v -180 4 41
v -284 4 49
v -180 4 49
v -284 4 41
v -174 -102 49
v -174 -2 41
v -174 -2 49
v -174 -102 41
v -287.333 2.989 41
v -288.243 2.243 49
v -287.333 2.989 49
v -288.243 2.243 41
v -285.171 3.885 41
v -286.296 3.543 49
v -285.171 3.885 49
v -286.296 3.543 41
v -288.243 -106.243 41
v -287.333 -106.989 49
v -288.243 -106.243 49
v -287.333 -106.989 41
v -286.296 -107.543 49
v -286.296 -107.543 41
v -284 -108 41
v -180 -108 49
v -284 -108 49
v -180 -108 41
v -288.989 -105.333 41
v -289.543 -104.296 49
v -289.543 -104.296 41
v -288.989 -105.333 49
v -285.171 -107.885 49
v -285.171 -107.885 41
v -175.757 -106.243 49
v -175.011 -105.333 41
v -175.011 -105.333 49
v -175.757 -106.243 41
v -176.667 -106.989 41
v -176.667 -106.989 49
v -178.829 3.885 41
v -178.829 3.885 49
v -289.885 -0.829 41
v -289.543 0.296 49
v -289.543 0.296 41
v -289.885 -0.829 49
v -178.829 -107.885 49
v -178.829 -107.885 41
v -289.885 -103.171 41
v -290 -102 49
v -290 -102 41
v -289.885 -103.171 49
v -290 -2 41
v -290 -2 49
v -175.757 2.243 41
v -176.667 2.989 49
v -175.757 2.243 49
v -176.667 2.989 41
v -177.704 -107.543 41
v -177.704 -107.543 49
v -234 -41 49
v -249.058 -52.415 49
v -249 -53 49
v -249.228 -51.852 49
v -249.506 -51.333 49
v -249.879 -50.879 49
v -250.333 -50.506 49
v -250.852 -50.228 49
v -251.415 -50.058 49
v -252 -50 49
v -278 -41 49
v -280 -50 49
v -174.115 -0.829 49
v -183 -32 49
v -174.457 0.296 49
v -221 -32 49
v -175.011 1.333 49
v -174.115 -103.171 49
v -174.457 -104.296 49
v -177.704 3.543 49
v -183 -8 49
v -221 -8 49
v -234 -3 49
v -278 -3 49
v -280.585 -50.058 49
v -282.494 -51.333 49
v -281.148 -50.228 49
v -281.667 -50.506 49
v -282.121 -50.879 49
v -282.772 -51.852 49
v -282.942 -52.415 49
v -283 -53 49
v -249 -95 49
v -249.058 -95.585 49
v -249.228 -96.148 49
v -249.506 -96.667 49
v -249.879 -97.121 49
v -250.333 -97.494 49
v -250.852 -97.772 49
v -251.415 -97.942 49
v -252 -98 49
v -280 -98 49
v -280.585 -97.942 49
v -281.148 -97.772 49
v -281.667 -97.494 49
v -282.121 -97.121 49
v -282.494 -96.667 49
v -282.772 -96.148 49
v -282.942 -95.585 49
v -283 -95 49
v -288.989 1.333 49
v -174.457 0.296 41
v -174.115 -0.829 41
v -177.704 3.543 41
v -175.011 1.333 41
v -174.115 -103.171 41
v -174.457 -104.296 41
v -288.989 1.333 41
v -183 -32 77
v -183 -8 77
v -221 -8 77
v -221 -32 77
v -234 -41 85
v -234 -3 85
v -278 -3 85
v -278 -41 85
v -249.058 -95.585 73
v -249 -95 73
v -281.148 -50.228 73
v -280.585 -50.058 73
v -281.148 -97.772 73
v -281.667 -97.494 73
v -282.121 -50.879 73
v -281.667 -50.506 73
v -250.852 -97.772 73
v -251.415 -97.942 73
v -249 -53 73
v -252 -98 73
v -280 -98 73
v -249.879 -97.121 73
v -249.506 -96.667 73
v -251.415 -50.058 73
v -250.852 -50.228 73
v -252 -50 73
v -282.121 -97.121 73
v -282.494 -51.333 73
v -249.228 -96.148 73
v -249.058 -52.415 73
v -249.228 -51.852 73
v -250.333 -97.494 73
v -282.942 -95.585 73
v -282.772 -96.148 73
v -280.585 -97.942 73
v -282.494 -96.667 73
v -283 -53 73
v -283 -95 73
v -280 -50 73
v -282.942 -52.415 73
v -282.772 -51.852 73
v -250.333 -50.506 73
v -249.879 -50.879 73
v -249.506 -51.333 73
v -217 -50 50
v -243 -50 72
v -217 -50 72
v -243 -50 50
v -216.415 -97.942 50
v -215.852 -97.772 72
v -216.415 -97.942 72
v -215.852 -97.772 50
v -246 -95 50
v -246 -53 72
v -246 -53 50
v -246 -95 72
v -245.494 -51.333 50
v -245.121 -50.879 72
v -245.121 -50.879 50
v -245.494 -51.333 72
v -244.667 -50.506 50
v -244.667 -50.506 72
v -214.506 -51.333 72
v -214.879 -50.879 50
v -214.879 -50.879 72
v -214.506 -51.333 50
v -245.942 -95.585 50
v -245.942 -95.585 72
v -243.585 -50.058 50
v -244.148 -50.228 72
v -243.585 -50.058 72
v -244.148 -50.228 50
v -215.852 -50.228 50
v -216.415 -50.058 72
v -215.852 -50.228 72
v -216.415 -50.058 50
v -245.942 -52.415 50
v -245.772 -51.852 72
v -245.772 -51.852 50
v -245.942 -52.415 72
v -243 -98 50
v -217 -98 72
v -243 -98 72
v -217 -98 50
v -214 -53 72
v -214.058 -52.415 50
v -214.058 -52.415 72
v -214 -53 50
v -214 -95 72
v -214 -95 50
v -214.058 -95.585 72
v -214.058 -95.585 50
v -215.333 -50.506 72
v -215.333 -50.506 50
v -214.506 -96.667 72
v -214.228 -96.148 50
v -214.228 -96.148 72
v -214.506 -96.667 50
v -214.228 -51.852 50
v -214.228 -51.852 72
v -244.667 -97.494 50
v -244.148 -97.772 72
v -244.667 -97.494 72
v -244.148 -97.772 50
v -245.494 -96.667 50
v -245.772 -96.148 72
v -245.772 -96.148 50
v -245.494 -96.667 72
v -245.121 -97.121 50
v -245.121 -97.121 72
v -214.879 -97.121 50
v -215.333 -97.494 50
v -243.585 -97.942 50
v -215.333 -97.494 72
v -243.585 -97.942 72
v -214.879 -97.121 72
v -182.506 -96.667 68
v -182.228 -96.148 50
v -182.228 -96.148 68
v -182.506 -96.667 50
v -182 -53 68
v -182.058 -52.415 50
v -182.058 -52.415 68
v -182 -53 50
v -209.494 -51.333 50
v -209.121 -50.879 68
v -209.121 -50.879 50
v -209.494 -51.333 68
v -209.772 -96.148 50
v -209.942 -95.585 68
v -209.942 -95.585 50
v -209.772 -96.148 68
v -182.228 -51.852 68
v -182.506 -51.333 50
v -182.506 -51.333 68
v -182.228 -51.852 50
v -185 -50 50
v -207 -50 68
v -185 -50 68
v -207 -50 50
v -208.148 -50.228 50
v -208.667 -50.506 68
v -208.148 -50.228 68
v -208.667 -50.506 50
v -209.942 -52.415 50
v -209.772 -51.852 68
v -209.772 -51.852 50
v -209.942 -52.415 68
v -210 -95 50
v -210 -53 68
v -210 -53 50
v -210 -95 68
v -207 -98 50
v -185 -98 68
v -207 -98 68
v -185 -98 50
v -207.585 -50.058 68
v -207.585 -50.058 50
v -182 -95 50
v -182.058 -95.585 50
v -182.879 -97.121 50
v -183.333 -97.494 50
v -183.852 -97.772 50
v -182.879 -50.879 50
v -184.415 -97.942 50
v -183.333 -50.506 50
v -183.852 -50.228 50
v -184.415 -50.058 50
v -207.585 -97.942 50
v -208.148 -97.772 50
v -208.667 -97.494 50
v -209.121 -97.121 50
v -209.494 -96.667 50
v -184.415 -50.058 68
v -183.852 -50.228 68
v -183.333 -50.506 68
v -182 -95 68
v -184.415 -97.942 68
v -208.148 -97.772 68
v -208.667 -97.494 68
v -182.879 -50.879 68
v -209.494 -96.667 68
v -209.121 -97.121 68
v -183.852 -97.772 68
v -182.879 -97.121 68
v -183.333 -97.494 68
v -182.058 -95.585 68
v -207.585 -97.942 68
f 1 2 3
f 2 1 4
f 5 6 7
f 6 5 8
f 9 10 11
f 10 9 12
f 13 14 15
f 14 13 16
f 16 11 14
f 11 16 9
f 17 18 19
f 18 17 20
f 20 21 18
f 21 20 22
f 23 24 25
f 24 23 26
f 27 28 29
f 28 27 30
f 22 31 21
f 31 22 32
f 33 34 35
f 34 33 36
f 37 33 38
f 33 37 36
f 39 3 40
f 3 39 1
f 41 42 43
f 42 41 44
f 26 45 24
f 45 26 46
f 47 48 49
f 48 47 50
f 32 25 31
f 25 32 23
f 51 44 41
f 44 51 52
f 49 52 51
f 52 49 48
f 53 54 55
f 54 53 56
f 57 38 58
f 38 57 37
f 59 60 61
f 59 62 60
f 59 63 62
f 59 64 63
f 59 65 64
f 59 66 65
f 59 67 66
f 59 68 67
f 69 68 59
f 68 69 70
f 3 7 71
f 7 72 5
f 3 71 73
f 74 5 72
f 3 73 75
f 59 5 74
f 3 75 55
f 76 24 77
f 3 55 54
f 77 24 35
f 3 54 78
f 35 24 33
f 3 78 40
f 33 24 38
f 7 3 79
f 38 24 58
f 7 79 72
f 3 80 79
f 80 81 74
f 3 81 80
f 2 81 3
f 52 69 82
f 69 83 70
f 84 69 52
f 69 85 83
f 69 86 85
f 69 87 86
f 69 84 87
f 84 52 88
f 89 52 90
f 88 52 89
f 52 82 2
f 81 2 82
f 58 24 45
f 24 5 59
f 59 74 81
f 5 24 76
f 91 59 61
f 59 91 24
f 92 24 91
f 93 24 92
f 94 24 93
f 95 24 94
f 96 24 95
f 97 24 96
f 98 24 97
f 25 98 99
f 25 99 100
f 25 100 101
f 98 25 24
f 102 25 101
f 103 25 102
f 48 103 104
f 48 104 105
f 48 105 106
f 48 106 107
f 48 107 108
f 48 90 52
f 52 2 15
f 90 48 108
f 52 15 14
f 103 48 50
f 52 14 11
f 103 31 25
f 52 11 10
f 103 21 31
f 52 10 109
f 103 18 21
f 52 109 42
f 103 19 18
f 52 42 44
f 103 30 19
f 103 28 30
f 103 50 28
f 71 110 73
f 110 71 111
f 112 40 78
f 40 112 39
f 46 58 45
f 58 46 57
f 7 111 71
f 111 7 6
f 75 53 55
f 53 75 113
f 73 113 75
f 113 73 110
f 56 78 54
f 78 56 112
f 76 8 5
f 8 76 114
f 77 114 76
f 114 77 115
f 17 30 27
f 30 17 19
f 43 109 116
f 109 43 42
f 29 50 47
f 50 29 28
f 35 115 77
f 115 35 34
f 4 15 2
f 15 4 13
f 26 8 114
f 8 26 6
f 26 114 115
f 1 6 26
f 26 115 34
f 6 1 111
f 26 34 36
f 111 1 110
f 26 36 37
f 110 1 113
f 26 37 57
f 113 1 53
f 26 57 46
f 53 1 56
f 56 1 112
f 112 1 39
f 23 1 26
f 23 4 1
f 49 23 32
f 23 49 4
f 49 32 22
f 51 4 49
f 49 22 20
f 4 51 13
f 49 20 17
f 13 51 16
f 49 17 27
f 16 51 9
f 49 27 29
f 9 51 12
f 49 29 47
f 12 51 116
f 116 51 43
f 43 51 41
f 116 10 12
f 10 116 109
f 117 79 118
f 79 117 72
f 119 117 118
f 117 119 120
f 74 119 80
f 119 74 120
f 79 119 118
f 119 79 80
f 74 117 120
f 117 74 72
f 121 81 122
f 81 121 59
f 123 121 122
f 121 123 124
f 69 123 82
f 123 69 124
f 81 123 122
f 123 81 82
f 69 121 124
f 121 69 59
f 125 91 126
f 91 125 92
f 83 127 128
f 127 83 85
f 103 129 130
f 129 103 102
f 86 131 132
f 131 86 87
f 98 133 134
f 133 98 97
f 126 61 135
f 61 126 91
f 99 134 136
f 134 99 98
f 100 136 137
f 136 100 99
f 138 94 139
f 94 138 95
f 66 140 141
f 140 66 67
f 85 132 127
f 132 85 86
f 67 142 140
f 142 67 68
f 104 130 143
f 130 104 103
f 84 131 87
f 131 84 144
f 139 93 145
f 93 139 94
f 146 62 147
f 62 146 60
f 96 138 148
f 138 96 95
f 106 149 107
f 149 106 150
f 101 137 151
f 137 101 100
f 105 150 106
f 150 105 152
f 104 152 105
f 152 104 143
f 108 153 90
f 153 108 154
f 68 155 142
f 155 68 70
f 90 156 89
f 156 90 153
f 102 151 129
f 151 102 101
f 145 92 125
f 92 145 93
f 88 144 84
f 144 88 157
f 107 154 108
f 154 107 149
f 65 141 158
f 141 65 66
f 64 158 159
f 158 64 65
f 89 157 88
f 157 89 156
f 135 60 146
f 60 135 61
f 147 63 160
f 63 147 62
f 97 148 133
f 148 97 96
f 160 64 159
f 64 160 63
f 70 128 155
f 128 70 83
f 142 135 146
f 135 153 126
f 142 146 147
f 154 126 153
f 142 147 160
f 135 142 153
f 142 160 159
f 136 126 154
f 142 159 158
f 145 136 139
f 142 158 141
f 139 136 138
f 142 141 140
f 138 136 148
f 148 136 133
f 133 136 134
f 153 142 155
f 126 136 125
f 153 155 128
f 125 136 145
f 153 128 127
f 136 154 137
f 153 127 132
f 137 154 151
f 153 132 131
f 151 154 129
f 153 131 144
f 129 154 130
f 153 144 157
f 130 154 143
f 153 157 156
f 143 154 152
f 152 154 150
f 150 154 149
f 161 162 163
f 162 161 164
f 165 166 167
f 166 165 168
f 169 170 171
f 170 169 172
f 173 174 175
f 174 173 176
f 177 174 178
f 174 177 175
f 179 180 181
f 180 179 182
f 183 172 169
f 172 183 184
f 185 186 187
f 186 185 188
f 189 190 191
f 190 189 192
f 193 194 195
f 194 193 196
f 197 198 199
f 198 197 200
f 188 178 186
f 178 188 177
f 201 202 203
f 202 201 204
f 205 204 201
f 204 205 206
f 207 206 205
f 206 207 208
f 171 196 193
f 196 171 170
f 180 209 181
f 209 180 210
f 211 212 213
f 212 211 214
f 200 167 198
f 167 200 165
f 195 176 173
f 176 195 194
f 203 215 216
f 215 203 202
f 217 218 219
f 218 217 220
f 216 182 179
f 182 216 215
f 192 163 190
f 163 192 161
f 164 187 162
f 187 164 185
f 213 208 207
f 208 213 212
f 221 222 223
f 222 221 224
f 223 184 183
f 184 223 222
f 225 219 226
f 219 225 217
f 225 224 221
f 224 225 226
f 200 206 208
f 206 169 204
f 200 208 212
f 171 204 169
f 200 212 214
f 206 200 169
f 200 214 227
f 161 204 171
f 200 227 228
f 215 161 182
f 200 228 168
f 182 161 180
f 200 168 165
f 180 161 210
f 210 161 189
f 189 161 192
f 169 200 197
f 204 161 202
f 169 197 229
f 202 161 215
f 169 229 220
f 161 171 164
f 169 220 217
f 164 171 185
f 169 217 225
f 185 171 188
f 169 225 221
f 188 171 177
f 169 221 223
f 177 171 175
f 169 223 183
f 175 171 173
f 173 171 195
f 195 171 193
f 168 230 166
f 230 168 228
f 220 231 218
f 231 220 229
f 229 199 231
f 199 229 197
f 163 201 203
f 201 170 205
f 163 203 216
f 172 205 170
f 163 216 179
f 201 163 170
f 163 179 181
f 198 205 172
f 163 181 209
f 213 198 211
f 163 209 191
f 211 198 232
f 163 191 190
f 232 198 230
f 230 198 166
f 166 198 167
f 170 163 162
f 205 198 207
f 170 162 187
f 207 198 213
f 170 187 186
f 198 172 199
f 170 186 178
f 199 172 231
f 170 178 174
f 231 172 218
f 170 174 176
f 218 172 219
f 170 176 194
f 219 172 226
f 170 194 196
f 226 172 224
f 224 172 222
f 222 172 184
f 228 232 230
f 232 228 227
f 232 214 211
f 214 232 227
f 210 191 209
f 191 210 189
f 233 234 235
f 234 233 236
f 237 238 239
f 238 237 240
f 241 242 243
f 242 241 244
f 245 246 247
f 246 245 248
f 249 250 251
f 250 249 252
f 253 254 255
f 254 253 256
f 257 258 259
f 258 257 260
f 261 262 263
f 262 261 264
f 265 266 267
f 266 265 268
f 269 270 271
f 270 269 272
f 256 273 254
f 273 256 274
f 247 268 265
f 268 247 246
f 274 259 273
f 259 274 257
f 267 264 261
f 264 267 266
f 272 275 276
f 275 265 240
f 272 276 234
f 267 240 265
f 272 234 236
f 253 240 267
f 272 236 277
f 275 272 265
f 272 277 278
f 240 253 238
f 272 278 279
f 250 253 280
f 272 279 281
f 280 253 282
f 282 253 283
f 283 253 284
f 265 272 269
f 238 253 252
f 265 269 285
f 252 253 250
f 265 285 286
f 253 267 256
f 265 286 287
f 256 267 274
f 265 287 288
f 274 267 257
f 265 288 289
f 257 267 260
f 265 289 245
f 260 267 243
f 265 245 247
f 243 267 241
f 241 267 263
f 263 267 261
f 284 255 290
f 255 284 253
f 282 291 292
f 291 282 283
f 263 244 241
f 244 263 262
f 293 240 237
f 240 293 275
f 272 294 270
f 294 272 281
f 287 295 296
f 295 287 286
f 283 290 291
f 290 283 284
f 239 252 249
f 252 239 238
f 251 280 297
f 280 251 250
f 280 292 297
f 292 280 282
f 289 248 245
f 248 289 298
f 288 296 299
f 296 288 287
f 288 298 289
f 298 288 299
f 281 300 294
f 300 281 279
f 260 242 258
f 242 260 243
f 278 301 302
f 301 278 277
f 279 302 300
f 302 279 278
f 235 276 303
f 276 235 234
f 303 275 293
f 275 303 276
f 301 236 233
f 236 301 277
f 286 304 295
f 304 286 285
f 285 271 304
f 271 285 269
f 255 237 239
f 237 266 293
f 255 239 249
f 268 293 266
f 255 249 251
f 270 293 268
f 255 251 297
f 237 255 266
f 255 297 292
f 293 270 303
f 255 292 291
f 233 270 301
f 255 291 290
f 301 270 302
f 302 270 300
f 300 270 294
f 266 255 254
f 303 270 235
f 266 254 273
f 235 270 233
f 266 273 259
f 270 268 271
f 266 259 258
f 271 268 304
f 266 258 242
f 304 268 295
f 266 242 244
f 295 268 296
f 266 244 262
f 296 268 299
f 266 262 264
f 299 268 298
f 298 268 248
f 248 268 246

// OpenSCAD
export_only = true;
include <main.scad>
power_distribution();
